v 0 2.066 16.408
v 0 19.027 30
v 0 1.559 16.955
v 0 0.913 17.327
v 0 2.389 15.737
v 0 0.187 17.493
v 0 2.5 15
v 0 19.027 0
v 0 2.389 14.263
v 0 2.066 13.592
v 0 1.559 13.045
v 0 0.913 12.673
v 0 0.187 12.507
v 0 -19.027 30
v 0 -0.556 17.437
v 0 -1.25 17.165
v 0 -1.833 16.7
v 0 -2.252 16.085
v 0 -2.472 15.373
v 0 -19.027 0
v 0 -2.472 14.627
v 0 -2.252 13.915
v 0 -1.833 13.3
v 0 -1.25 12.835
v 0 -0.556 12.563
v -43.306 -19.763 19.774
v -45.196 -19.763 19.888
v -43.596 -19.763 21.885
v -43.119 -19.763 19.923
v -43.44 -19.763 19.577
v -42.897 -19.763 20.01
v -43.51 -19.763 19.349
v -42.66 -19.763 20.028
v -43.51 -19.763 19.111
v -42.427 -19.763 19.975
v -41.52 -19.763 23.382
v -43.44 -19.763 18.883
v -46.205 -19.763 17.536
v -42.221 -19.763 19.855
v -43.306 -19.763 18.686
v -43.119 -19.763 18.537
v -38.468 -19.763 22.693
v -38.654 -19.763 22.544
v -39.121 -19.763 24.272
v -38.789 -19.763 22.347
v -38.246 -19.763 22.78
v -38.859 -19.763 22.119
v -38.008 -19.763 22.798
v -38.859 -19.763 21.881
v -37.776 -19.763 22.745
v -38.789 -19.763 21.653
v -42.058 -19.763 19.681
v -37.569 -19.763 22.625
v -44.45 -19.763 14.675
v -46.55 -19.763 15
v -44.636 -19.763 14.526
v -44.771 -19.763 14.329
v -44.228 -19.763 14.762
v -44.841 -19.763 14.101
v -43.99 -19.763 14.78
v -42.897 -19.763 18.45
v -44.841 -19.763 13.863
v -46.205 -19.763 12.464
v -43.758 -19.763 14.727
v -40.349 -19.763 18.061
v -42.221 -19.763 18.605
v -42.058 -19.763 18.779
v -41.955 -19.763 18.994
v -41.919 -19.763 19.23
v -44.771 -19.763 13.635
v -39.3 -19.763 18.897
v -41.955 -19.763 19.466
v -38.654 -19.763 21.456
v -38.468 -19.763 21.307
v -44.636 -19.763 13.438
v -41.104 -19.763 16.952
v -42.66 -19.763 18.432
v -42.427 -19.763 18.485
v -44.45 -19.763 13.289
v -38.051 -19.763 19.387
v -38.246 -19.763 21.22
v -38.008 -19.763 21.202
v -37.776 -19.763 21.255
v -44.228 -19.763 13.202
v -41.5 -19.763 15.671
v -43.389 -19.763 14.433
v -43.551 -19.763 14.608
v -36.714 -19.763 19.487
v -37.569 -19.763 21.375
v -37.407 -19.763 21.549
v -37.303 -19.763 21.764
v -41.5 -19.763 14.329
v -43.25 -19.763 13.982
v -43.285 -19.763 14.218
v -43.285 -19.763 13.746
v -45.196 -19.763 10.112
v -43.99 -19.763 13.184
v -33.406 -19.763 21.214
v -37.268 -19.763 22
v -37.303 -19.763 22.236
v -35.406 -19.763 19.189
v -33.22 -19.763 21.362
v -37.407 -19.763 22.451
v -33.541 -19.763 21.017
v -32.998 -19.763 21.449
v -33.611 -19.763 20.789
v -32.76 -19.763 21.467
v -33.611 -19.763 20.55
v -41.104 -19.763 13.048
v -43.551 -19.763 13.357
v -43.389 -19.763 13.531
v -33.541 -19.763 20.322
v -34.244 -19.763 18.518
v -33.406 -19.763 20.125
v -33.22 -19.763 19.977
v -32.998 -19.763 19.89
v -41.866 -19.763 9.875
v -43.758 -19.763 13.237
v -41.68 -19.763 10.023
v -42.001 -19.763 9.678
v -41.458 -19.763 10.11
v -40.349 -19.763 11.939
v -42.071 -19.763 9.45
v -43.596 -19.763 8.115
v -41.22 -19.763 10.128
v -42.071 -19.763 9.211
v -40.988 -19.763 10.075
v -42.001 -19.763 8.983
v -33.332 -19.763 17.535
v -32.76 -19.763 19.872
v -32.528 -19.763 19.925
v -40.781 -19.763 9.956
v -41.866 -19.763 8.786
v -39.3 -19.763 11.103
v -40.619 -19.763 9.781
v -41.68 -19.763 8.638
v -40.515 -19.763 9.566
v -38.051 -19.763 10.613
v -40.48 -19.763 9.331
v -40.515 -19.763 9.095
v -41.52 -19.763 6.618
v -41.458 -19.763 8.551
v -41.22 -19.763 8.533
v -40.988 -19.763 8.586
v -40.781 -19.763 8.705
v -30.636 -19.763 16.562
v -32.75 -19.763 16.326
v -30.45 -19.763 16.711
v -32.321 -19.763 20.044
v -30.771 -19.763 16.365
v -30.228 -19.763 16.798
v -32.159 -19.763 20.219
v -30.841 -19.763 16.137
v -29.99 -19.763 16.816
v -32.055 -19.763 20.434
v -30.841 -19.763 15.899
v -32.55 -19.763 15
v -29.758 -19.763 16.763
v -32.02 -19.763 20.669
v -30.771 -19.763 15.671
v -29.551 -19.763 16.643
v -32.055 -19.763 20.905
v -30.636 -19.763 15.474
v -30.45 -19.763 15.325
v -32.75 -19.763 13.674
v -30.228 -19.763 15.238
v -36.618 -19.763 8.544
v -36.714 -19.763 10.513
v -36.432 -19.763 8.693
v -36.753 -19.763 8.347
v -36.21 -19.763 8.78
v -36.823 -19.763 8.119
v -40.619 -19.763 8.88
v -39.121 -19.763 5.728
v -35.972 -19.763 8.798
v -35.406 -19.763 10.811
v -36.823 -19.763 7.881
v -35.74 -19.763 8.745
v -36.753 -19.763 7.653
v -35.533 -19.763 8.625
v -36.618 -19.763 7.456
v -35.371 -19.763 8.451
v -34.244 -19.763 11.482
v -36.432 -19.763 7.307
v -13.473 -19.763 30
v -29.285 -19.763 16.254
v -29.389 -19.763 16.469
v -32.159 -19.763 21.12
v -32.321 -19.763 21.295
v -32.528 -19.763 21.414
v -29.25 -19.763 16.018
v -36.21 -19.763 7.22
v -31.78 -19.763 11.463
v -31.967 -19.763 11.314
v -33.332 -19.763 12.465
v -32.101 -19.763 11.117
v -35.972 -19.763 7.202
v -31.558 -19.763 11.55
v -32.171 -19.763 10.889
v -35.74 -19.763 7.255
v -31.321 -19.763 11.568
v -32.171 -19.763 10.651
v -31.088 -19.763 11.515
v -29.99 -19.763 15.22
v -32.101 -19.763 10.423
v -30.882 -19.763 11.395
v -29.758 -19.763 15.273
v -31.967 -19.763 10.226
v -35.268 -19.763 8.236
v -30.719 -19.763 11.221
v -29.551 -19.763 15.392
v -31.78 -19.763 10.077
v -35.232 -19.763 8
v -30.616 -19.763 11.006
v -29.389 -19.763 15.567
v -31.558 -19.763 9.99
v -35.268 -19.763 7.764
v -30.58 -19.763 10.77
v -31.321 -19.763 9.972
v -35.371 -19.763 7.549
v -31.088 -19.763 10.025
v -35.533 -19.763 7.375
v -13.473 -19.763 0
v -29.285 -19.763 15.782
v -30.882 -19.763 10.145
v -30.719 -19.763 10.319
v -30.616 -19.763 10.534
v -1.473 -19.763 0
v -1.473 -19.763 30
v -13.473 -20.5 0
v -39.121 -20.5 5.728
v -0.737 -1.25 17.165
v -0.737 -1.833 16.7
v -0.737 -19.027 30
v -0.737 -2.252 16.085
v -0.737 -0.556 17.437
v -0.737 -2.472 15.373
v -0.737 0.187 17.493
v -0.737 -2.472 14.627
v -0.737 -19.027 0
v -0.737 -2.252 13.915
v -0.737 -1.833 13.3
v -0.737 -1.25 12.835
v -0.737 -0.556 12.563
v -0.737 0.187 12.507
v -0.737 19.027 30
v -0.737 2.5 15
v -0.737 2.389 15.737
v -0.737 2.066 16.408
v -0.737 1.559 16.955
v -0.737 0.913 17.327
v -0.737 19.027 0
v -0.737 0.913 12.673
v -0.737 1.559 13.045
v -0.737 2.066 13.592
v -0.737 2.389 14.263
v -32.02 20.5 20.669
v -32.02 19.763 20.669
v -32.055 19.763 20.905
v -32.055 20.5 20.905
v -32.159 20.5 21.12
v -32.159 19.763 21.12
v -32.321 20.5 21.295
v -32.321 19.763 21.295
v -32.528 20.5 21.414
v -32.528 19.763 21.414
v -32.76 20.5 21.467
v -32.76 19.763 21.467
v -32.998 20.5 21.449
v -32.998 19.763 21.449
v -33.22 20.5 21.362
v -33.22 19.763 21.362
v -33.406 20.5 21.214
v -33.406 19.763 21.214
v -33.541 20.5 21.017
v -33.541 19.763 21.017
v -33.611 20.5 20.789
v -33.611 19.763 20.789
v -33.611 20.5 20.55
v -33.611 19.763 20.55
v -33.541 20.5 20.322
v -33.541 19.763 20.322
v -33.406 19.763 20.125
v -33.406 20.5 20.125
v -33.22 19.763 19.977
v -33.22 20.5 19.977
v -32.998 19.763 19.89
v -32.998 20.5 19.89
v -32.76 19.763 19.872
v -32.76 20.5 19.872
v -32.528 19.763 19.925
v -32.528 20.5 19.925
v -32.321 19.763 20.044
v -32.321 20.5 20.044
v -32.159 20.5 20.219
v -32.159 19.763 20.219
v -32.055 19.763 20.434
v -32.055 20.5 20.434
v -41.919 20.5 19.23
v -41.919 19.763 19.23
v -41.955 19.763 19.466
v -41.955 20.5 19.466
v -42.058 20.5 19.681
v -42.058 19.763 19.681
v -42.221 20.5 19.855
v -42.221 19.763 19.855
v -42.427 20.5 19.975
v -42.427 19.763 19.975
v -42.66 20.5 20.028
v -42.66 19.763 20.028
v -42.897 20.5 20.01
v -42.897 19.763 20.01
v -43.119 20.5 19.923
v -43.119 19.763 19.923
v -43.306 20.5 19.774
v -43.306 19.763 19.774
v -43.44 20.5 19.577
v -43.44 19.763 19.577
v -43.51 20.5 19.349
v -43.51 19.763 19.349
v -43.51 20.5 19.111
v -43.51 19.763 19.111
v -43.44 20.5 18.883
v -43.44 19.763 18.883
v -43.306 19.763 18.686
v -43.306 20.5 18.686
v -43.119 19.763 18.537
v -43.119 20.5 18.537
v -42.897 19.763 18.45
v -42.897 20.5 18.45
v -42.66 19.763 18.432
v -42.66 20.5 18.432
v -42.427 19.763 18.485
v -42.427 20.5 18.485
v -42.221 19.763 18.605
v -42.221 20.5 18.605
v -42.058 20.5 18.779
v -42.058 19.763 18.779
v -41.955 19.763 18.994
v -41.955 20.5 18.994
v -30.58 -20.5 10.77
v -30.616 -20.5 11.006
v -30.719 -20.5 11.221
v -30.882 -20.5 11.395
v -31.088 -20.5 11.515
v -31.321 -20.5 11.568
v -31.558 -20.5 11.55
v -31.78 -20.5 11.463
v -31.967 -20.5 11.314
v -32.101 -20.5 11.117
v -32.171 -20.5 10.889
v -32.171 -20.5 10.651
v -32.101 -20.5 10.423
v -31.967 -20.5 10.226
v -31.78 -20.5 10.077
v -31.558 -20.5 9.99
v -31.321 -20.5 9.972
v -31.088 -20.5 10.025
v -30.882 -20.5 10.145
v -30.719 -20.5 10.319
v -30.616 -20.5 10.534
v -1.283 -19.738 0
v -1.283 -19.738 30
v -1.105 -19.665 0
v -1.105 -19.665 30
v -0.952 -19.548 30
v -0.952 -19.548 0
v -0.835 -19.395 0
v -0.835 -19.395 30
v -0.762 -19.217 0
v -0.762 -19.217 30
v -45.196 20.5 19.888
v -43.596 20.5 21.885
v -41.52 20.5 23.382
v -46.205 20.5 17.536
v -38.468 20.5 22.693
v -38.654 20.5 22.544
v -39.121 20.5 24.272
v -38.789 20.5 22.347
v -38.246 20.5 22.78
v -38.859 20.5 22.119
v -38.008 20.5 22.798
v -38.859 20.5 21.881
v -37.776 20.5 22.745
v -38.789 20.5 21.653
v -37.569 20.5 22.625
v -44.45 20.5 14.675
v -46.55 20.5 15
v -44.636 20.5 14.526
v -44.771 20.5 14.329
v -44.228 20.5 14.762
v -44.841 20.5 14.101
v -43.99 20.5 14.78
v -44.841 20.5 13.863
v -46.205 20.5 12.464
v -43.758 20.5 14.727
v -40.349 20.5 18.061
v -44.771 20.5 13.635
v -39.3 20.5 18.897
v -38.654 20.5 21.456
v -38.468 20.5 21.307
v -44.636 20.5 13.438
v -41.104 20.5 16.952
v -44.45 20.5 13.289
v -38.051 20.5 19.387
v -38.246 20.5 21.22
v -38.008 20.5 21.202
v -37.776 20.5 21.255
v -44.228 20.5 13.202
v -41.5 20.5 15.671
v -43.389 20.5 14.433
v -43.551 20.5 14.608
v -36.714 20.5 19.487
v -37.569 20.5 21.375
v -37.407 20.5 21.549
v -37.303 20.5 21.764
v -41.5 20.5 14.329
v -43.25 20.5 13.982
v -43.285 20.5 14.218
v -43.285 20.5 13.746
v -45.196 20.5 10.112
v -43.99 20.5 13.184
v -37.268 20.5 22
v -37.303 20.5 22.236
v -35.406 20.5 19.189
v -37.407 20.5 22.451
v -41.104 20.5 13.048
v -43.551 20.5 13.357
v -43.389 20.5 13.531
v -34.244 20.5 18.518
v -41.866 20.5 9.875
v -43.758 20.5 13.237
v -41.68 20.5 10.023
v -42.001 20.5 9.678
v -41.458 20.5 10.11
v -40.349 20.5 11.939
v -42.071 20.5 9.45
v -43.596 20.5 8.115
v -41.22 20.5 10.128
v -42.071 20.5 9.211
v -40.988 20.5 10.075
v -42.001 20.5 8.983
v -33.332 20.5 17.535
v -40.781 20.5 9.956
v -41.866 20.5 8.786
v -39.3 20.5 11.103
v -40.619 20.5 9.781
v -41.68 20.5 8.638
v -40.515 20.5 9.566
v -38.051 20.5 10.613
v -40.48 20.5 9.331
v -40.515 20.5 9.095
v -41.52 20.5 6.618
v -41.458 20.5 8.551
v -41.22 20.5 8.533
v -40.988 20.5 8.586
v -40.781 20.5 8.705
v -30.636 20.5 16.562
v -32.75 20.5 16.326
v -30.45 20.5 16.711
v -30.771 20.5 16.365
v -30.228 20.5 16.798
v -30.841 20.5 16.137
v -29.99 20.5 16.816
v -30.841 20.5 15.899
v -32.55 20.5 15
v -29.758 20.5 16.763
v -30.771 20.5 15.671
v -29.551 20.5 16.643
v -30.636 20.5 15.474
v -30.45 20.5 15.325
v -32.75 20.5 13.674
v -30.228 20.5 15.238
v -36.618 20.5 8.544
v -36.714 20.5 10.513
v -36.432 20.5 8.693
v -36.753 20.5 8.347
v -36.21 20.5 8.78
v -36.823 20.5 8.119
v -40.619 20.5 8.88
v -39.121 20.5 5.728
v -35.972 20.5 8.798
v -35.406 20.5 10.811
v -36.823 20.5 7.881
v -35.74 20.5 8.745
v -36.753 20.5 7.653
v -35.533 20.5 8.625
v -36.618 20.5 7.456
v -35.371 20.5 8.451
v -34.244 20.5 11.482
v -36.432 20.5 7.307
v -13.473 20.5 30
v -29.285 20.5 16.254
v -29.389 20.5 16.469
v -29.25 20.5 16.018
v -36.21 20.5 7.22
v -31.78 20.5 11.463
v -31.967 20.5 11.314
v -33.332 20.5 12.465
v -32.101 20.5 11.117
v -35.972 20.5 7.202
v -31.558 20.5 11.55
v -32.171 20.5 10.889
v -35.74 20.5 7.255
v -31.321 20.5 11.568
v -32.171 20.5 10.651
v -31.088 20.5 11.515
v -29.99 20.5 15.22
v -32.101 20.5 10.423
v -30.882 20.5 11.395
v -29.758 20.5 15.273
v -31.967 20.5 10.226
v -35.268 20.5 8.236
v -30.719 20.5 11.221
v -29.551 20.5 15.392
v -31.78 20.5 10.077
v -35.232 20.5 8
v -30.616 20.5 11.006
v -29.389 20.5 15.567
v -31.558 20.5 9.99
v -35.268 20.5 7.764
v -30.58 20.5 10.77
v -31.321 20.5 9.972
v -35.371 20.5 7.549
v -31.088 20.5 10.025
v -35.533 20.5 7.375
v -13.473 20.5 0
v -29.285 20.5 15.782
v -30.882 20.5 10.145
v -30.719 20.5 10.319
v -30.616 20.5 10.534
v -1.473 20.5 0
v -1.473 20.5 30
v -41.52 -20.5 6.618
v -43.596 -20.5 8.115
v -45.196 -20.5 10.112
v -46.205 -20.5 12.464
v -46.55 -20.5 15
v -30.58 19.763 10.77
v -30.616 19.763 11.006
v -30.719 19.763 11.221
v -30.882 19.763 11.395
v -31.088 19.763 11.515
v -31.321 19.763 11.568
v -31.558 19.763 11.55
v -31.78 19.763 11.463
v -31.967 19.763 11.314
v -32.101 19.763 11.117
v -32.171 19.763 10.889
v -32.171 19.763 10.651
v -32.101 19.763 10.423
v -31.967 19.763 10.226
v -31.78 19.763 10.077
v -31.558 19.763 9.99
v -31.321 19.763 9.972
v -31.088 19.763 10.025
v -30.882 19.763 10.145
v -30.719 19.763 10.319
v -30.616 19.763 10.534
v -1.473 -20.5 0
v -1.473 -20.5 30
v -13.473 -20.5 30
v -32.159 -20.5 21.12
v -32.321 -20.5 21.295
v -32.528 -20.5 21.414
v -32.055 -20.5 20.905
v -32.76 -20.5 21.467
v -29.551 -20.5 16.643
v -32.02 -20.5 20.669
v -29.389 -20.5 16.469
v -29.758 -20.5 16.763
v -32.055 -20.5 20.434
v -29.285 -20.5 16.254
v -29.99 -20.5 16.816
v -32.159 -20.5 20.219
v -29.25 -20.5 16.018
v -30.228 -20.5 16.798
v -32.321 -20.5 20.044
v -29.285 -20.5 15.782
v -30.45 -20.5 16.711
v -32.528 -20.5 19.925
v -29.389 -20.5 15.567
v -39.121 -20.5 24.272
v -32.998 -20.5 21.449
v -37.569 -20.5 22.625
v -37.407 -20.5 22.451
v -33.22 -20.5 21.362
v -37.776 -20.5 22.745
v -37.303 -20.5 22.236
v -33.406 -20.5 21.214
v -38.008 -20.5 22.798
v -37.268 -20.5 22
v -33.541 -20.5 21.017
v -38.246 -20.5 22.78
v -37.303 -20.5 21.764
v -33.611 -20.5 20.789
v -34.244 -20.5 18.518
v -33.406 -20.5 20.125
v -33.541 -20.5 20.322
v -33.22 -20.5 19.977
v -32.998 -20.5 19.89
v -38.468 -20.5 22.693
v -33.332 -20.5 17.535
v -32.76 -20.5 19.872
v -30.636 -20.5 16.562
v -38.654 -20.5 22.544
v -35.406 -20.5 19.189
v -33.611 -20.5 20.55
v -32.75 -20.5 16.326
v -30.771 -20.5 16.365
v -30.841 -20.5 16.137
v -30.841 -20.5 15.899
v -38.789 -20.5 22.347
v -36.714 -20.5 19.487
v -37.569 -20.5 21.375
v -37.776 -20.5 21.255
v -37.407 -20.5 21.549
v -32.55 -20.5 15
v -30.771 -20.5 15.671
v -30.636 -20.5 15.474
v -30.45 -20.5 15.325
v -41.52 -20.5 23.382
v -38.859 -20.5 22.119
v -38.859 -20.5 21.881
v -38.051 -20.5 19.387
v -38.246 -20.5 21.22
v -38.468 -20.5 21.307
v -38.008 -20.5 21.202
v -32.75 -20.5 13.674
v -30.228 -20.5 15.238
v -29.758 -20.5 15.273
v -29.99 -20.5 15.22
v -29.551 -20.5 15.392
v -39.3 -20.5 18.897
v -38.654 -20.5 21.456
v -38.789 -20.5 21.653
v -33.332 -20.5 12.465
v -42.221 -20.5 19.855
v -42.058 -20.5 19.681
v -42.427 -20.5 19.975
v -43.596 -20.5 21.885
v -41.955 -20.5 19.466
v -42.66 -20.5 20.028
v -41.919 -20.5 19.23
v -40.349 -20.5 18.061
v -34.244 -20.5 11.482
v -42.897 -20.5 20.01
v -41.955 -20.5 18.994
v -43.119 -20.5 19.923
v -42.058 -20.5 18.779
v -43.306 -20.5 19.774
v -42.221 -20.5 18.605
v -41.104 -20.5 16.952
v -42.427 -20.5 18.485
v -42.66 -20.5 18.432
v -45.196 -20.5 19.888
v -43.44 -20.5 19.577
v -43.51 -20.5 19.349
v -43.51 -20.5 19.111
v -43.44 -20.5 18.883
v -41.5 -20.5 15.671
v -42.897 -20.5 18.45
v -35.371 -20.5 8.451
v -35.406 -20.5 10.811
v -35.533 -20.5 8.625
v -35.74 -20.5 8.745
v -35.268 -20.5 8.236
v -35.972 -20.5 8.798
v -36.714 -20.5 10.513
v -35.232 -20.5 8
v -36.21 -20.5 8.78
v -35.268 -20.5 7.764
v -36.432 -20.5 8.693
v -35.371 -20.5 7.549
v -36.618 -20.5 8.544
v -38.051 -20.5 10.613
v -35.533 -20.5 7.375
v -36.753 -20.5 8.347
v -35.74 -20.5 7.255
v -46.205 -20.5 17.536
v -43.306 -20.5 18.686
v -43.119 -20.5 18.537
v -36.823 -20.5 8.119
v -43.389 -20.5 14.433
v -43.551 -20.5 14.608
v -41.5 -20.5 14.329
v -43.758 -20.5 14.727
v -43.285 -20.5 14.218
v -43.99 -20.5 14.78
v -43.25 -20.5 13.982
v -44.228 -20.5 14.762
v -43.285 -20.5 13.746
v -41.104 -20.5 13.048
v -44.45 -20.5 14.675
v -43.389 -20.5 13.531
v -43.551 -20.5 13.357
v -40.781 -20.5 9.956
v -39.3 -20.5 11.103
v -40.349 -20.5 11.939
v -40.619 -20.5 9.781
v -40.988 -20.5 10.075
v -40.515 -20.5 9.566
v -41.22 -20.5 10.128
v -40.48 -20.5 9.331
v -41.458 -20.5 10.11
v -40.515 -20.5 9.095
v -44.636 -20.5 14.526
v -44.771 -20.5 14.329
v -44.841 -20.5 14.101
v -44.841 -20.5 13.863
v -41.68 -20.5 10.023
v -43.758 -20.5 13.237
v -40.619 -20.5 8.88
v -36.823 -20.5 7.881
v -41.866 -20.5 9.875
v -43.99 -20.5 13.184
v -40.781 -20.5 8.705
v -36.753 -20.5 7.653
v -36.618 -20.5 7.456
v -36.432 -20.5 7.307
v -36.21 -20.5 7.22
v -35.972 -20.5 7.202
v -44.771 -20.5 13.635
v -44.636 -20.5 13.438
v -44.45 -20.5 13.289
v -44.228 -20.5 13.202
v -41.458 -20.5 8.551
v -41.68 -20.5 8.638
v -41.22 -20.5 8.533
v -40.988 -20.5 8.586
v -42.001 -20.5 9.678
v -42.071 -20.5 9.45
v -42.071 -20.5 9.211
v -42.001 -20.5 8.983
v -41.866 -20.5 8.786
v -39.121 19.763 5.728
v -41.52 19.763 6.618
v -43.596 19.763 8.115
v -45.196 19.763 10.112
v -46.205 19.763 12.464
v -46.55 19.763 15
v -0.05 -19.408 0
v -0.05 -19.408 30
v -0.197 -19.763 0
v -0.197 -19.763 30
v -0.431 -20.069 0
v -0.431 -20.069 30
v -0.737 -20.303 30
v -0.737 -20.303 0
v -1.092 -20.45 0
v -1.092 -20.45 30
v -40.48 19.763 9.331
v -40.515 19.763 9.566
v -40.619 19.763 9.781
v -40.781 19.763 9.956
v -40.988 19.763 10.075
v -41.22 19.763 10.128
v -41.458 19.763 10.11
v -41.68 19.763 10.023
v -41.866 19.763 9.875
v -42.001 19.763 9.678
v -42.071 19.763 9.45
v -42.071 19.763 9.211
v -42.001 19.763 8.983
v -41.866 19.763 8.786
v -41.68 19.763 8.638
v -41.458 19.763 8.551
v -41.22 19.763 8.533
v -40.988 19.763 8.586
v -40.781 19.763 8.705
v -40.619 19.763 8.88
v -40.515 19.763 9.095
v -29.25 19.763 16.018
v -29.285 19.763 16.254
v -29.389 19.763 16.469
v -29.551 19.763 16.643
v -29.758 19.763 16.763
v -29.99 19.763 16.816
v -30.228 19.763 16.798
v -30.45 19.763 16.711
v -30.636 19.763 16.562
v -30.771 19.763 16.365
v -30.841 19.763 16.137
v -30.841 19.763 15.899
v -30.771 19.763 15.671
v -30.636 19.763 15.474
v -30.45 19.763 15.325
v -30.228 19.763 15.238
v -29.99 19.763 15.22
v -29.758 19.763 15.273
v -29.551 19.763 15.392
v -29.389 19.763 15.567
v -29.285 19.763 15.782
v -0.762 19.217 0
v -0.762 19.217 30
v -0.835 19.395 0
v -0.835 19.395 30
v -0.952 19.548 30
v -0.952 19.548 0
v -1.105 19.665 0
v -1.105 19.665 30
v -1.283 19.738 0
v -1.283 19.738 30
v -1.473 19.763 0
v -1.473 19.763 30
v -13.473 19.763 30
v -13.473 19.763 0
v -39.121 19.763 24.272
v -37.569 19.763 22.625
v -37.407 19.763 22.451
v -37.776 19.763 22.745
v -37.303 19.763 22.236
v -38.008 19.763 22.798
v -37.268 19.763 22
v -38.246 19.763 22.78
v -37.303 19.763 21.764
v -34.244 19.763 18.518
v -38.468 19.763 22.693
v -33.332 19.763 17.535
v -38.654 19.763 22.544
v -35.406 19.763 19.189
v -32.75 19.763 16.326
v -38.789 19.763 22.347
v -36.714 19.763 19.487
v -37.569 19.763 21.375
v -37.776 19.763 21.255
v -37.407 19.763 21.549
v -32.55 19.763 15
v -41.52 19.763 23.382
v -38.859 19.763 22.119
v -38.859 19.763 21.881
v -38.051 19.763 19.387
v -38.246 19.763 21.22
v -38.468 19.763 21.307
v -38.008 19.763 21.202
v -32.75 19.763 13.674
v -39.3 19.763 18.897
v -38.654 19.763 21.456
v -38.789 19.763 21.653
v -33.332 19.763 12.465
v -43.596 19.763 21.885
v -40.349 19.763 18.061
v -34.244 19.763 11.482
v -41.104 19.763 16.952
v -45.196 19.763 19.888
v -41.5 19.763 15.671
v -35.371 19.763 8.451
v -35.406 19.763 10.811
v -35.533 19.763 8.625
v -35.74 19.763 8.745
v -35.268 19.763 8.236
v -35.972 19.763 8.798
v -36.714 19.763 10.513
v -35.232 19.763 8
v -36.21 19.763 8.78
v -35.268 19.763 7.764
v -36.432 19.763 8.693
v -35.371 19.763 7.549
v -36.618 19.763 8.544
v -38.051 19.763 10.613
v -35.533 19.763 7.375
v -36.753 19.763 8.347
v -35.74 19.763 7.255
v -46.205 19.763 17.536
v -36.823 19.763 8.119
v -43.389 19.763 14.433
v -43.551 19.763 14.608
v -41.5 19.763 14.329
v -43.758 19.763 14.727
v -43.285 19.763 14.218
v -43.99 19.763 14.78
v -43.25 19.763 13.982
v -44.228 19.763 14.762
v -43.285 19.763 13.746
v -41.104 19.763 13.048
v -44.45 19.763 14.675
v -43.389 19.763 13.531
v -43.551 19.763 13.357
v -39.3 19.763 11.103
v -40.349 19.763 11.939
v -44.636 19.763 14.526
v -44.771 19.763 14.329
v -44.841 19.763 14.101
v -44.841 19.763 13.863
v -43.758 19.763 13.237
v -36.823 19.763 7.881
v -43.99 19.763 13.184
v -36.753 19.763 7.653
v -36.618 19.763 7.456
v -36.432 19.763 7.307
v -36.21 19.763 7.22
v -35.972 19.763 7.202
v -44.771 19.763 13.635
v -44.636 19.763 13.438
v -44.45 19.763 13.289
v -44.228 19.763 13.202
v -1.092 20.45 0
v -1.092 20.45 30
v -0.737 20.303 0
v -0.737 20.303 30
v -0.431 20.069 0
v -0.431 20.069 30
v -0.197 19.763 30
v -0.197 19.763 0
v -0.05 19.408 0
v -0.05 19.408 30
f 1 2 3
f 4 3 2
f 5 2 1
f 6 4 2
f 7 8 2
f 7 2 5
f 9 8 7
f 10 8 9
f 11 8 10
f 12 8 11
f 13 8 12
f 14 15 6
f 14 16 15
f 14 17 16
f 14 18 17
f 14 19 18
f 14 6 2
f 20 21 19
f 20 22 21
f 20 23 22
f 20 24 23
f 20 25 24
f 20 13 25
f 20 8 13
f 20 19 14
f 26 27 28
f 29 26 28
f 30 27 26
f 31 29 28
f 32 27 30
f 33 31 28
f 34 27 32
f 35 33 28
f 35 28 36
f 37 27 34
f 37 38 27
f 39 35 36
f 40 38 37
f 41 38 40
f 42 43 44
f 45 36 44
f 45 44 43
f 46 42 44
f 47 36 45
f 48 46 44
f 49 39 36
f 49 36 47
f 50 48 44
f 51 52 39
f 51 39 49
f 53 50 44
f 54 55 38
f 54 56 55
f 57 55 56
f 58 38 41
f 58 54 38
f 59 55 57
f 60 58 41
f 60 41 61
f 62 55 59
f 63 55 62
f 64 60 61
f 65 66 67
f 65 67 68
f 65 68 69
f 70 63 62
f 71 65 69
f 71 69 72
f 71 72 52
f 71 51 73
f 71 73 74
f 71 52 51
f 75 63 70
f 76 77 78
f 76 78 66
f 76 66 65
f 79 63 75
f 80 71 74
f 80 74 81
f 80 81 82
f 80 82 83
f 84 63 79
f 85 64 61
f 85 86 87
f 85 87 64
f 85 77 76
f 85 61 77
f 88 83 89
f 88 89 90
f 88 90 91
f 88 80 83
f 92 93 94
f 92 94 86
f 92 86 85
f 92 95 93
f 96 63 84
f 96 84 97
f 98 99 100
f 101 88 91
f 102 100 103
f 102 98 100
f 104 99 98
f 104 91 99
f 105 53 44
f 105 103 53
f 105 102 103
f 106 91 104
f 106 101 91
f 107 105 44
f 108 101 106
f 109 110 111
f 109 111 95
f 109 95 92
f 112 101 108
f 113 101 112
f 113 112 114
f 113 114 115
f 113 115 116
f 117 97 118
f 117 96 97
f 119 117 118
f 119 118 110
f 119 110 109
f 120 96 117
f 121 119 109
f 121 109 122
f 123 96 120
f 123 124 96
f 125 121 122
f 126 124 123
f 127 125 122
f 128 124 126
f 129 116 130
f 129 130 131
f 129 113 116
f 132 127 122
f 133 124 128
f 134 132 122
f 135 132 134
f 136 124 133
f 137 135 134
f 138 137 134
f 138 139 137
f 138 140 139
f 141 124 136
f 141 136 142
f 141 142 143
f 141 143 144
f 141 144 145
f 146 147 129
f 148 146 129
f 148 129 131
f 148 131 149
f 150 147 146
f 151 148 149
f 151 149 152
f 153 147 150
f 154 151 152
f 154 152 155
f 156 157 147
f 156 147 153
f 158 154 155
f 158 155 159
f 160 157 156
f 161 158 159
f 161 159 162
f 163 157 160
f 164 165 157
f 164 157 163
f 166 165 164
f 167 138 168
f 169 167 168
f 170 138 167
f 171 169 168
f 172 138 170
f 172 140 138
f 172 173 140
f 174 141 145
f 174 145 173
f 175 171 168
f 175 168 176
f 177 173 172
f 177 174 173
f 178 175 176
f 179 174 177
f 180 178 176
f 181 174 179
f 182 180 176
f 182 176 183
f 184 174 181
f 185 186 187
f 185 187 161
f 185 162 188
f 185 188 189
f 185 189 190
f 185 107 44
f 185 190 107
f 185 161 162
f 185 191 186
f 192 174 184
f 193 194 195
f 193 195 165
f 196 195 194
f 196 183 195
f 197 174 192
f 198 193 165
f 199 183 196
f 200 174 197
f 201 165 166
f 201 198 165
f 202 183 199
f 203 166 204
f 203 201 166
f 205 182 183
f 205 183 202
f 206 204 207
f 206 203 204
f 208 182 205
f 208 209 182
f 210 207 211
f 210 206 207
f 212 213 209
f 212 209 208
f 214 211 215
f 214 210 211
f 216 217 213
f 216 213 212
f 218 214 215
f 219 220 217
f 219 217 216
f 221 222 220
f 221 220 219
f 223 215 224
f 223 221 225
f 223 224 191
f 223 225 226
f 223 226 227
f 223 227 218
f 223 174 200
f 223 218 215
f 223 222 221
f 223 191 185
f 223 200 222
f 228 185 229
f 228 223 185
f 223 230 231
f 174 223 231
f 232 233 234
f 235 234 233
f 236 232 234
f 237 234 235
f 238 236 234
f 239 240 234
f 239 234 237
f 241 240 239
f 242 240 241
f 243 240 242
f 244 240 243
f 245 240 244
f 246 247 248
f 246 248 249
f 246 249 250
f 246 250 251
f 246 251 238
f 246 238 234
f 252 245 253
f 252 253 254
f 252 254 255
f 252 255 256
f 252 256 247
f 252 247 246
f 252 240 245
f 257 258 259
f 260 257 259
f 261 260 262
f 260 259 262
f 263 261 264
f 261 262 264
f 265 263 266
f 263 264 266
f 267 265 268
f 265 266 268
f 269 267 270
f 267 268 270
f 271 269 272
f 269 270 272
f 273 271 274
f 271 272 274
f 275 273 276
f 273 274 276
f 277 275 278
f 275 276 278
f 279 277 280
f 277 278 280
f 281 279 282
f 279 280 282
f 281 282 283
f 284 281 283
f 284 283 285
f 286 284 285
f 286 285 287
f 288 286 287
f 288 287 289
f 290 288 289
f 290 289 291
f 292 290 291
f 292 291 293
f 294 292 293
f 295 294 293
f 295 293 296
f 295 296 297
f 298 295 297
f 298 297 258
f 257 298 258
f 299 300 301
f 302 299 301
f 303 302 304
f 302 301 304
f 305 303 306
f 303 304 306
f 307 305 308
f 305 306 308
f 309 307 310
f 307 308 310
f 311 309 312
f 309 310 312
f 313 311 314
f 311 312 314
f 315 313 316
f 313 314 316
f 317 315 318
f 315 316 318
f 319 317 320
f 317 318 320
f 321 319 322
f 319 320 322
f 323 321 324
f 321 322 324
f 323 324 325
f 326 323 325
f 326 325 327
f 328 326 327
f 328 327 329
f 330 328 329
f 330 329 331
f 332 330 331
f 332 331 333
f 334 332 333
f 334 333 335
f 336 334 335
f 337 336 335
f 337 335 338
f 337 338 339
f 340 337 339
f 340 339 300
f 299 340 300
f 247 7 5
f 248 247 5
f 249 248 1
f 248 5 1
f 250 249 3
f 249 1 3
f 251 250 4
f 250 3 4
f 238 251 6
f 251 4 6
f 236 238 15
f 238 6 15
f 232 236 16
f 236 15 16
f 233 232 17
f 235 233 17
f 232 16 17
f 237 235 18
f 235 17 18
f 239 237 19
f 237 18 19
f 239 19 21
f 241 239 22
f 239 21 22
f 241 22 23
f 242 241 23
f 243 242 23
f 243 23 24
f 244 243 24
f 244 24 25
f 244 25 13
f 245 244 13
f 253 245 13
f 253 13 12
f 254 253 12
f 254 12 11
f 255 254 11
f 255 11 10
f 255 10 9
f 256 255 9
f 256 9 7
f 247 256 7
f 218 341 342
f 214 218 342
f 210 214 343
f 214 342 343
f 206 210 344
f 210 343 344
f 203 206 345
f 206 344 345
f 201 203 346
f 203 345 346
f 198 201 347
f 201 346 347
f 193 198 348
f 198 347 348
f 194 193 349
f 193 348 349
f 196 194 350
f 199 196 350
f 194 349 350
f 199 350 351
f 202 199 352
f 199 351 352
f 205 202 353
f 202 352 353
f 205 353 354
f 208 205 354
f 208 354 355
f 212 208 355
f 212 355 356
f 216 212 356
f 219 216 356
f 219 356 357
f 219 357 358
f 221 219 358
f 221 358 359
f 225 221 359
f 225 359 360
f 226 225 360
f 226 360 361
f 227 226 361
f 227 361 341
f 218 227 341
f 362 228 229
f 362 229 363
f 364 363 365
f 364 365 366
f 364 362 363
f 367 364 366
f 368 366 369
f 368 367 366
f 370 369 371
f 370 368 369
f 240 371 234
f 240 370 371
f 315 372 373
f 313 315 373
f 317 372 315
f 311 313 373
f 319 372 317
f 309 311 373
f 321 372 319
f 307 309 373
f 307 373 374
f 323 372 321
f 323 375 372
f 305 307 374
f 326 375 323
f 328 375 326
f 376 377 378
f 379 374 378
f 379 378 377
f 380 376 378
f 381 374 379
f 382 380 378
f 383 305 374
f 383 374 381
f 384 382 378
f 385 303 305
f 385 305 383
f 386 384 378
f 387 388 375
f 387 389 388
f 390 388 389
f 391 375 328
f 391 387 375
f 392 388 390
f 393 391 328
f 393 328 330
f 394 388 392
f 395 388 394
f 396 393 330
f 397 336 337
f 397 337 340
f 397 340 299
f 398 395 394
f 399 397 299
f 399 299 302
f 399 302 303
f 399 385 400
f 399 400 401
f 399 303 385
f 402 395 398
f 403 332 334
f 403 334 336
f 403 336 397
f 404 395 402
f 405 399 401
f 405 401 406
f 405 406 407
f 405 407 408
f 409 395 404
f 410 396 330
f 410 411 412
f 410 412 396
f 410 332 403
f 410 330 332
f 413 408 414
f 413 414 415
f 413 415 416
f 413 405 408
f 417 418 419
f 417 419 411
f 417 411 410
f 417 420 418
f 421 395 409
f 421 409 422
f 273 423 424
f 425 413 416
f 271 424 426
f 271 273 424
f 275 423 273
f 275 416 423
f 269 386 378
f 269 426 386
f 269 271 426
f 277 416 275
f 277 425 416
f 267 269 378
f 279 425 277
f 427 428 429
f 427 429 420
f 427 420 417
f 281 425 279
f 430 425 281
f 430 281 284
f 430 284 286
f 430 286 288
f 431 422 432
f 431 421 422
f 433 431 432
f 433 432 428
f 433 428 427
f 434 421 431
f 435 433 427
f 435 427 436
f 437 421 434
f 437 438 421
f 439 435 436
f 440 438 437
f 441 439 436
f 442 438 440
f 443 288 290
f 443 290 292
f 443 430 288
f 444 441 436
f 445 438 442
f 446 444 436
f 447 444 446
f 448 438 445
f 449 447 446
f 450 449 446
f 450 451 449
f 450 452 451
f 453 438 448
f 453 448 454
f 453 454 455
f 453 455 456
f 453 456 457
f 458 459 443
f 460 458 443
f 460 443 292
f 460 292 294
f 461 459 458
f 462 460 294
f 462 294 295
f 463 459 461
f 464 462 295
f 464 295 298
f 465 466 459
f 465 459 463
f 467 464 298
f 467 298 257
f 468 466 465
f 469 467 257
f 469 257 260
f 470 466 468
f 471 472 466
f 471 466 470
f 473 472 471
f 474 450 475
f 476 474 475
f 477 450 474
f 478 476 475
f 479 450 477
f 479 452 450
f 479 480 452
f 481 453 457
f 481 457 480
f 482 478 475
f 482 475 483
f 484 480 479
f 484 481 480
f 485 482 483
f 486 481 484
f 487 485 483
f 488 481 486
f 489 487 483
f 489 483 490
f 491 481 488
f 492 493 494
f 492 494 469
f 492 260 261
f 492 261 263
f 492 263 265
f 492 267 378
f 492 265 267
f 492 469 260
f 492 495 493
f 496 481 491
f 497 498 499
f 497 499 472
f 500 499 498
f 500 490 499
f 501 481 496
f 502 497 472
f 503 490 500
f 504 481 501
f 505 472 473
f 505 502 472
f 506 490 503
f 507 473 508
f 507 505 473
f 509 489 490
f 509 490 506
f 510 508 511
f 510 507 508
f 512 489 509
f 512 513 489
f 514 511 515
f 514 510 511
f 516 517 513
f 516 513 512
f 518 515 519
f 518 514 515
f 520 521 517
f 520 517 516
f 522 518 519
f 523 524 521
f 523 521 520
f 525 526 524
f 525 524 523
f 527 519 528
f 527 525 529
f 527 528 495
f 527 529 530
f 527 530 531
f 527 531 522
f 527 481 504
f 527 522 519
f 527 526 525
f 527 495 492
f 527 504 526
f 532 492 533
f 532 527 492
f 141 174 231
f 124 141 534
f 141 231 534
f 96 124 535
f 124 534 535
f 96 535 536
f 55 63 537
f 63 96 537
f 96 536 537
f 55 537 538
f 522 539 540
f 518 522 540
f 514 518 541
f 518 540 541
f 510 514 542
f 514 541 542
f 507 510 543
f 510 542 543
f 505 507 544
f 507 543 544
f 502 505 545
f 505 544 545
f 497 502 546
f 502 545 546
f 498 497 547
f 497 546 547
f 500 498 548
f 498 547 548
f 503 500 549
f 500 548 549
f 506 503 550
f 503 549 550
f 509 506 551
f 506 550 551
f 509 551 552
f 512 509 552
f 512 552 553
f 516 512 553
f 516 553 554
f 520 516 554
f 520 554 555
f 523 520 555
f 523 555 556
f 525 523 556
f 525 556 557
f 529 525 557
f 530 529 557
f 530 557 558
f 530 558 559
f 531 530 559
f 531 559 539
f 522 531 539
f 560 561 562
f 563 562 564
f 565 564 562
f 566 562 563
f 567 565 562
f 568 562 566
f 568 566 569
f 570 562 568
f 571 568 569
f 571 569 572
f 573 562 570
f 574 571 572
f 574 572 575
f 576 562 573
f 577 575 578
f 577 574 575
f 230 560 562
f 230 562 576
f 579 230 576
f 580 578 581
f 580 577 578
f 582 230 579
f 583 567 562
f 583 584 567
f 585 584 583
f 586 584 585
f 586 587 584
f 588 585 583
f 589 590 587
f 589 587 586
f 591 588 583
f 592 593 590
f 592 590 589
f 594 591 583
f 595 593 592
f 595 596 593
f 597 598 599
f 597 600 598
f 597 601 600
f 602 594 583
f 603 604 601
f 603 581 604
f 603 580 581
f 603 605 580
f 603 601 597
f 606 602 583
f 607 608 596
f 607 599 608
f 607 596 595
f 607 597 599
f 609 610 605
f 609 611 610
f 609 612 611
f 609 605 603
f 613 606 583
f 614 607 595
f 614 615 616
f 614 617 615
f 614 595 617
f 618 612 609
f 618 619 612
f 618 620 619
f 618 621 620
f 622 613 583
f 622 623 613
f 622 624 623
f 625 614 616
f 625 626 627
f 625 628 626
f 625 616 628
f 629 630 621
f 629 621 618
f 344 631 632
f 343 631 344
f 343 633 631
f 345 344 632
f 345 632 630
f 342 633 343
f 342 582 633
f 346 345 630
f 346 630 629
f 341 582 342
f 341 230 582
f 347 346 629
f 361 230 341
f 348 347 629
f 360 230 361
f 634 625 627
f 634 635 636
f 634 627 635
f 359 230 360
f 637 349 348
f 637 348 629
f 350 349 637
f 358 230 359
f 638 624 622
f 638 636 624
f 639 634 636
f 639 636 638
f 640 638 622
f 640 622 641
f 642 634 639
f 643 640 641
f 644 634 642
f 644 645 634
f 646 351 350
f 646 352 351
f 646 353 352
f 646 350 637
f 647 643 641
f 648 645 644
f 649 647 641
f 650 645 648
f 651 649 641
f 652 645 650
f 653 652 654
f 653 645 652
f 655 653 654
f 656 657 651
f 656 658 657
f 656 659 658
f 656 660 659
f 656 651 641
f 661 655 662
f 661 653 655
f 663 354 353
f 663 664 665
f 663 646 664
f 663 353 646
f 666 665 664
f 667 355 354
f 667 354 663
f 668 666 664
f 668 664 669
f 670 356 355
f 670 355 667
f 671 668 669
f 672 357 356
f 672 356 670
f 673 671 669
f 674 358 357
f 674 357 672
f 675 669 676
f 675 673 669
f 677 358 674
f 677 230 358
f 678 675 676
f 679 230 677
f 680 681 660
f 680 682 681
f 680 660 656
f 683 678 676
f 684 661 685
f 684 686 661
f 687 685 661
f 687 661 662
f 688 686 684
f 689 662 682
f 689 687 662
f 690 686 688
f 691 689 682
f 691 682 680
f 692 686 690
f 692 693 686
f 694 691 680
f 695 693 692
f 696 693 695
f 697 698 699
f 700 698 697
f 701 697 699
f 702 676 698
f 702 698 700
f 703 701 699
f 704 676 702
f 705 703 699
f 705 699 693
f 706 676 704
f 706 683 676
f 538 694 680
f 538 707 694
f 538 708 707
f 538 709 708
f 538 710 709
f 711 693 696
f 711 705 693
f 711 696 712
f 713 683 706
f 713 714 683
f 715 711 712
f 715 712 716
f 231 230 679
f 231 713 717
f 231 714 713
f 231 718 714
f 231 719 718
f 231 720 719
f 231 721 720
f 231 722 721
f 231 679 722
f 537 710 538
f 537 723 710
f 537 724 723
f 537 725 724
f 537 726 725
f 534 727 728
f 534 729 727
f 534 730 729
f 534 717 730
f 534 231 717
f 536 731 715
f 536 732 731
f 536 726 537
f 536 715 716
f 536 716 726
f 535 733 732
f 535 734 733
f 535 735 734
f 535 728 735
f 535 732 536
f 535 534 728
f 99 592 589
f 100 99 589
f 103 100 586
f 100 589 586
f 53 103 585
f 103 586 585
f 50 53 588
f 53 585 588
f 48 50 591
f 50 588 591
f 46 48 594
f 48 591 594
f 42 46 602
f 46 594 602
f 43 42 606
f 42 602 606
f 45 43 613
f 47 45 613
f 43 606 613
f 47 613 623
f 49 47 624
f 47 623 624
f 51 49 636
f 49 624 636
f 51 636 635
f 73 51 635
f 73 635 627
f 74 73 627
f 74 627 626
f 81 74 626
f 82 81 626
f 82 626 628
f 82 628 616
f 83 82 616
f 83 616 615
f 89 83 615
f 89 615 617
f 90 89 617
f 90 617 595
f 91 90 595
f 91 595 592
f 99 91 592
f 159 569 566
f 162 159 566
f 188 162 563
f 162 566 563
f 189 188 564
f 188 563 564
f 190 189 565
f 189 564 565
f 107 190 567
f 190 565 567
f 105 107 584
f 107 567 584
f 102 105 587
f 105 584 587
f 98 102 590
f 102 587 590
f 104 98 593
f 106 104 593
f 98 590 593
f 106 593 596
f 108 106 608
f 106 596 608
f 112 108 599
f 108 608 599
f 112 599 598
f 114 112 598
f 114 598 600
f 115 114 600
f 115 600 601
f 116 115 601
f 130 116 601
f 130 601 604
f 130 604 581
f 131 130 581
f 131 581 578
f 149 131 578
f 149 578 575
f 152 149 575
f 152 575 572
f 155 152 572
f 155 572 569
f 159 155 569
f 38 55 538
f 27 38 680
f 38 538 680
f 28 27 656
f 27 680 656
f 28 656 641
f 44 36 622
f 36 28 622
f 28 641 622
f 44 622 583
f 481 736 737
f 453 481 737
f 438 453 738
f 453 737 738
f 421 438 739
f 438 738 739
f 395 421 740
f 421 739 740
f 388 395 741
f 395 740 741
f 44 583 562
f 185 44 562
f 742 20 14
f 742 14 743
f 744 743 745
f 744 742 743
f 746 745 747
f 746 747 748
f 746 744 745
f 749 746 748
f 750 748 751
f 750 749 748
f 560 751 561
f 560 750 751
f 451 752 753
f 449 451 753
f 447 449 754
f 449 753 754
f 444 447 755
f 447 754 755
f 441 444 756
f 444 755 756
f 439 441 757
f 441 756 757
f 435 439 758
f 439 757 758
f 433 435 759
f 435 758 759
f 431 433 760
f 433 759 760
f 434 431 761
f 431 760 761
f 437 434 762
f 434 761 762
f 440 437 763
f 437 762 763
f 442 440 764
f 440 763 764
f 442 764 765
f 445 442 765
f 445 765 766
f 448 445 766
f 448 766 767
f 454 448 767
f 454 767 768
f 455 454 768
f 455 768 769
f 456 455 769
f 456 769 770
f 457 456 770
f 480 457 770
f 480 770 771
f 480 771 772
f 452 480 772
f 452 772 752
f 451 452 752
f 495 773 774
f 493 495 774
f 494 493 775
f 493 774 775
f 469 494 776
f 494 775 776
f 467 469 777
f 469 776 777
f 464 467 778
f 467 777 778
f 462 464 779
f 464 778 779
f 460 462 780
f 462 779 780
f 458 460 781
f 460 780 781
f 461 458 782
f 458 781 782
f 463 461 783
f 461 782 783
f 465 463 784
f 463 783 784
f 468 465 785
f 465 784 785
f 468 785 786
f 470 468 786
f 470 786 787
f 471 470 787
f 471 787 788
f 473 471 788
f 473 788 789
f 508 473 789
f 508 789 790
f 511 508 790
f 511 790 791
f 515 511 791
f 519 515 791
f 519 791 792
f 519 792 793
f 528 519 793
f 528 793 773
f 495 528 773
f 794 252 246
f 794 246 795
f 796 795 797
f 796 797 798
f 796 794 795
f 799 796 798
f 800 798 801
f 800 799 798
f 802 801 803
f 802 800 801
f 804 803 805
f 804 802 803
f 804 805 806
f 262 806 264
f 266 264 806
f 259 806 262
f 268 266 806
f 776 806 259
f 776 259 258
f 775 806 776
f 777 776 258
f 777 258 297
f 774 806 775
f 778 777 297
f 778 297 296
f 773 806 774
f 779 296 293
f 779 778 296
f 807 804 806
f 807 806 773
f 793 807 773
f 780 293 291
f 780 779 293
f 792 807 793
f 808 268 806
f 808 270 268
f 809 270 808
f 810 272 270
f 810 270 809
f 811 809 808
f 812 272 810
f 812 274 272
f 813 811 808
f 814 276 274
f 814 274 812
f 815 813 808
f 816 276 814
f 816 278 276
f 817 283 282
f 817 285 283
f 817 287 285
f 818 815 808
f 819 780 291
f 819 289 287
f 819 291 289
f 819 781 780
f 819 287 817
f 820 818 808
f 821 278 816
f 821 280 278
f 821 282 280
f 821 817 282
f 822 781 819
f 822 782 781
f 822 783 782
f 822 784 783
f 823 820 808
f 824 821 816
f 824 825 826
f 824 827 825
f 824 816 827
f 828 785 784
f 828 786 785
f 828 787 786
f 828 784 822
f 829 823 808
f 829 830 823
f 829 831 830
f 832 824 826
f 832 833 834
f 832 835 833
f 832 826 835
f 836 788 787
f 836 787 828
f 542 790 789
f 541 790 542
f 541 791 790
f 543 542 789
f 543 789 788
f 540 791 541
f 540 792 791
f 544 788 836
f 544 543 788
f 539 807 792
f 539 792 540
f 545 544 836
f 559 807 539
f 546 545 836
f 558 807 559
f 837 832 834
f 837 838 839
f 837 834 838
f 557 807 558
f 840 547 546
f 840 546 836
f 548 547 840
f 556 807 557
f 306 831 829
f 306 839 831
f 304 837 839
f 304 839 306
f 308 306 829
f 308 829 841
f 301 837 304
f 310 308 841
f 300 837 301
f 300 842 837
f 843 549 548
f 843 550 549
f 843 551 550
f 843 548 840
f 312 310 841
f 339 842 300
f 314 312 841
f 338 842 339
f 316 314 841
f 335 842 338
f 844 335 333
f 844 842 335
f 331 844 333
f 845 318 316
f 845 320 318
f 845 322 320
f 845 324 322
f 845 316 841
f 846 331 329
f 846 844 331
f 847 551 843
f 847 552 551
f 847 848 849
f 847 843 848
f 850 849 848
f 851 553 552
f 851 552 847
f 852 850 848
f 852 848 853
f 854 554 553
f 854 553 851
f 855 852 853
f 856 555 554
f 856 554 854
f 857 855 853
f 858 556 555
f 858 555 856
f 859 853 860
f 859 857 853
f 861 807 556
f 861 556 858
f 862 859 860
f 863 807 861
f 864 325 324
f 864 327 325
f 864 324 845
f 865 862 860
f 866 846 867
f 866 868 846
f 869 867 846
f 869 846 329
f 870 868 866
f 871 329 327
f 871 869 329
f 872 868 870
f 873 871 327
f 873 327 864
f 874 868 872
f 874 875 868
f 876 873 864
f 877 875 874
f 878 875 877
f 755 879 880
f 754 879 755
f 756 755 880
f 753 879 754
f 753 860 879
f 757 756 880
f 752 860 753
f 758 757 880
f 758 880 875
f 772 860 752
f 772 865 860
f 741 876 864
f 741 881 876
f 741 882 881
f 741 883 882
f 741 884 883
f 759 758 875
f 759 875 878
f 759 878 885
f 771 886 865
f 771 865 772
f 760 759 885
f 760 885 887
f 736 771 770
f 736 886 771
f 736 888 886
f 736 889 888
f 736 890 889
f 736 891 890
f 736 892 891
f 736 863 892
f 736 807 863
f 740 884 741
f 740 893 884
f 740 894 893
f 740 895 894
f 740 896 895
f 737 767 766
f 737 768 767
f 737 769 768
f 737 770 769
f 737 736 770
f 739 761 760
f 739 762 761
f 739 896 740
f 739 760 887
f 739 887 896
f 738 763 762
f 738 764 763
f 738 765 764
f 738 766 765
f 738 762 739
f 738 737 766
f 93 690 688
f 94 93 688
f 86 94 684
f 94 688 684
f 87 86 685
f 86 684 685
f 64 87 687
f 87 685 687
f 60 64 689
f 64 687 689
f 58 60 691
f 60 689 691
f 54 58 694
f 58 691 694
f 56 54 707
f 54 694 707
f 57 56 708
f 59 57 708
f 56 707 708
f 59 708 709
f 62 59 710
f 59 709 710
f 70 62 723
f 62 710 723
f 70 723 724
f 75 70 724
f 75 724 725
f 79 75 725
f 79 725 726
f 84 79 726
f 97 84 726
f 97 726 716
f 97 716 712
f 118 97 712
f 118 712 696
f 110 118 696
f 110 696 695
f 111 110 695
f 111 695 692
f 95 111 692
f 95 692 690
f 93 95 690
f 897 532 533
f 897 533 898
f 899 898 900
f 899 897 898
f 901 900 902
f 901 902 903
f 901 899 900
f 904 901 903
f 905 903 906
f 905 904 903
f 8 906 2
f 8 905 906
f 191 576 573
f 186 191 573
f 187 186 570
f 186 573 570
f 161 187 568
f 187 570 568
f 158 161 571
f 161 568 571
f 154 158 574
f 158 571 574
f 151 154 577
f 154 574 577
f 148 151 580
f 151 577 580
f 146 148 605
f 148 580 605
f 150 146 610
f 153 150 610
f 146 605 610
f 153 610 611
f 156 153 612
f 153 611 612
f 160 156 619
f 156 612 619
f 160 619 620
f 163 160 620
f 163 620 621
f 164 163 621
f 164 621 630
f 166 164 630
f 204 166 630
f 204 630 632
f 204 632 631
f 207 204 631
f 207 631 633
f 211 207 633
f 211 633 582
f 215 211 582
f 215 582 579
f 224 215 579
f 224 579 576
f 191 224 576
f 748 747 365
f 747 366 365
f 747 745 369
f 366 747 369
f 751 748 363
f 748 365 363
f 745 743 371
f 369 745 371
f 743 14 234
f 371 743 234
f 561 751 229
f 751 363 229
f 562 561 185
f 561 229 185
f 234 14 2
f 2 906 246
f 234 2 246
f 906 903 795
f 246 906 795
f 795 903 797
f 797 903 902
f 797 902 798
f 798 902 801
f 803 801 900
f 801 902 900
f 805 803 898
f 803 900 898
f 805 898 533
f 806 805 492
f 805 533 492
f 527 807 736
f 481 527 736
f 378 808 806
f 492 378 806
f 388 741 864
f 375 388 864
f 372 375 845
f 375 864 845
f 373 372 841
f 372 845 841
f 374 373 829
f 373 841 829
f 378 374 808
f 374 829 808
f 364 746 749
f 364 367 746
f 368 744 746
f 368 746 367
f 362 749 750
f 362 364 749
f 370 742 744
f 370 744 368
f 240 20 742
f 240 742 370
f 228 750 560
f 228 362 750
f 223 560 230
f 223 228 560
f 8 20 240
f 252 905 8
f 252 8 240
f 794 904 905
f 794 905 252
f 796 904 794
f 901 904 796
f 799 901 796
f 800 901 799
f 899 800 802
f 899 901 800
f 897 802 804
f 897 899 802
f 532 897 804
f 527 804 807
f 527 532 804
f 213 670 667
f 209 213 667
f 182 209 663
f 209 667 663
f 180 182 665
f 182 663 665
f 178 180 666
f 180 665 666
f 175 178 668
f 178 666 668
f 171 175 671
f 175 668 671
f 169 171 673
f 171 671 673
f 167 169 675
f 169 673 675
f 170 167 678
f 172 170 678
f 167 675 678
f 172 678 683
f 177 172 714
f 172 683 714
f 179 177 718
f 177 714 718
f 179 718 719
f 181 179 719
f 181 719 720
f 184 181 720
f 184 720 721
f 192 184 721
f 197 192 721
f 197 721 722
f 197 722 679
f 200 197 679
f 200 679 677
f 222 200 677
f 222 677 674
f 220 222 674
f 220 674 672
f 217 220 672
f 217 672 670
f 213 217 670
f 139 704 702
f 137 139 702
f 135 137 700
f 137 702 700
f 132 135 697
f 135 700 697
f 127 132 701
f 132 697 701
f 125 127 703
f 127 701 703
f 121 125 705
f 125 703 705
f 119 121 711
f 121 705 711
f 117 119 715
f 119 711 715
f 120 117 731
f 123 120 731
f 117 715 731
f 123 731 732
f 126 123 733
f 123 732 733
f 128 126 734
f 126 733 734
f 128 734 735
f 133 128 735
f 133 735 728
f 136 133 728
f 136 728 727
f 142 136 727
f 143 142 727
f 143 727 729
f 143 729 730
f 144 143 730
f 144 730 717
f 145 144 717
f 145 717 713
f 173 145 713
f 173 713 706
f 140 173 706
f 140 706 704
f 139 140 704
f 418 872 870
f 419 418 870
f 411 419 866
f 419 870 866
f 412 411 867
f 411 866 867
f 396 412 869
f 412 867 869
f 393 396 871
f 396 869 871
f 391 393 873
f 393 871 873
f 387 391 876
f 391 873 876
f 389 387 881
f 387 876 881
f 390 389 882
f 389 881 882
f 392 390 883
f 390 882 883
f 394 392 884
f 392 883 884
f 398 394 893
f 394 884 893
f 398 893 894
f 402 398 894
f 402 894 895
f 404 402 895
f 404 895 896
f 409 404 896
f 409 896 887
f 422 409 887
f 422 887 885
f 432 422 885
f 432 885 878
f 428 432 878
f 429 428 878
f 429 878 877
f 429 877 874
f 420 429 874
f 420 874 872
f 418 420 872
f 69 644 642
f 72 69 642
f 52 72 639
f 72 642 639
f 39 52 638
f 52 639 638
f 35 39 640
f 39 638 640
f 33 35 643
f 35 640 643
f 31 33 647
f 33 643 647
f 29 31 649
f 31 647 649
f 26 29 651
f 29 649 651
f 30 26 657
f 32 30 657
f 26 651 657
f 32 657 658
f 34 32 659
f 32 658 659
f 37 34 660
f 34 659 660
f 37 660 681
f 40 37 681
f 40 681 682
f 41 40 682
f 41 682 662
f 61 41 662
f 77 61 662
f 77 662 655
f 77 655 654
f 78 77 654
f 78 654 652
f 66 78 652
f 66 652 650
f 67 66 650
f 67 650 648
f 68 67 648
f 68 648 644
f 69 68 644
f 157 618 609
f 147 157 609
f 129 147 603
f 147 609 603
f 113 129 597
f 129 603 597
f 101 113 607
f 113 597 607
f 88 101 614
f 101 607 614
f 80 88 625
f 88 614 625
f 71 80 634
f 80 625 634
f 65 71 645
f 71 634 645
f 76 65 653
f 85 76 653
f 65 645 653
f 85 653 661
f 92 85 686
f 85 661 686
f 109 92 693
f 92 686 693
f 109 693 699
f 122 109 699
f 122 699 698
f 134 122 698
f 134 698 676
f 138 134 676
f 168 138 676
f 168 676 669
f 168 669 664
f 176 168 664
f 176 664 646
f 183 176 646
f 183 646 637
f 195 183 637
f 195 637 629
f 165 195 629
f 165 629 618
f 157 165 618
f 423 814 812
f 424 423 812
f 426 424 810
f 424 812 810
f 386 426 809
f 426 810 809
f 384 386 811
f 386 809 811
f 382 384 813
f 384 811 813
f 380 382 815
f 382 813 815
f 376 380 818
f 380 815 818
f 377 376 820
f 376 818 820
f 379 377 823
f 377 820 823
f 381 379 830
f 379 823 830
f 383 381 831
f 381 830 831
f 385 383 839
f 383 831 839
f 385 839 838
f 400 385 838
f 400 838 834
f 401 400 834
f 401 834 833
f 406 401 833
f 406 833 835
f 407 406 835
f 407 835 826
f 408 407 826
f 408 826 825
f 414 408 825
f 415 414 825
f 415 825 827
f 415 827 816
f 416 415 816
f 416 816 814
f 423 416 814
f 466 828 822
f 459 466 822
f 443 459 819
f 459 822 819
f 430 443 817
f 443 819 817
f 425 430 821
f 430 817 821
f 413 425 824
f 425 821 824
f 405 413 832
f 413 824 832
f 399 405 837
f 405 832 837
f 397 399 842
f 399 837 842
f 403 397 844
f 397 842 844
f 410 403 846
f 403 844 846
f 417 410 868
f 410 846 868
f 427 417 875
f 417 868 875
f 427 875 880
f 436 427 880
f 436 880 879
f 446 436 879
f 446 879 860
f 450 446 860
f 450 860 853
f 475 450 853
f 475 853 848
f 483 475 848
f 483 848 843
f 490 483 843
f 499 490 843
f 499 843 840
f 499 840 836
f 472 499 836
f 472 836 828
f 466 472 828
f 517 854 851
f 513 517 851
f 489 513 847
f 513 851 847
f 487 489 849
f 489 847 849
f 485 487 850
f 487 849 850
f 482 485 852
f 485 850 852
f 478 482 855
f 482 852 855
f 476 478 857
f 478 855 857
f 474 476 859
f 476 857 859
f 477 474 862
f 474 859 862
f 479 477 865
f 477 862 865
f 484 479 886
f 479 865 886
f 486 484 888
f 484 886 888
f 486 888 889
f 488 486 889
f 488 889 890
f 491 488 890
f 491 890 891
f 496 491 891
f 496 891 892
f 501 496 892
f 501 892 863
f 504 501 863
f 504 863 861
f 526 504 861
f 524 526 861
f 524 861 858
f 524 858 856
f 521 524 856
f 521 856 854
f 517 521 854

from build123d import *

# Parameters (mm, degrees)
T_LE_DE_BASE_PLI_E1_DEPTH = 30
ESQUISSE13_R              = 4.5
ESQUISSE13_R_2            = 0.8
ENL_V_MAT_EXTRU_2_DEPTH   = 72.281133549
SKETCH1_R                 = 2.5
CUT_EXTRUDE1_DEPTH        = 60.052053397


# Sheet-metal steps are written as plain solids
with BuildPart() as part:
    # Esquisse1 → Tôle de base pliée1 (new body)
    with BuildSketch(Plane.XY):
        with BuildLine():
            Line((-50, 20.5), (-1.4732, 20.5))
            ThreePointArc((-1.4732, 20.5), (-0.43149029, 20.06850971), (0, 19.0268))
            Line((0, 19.0268), (0, -19.0268))
            ThreePointArc((0, -19.0268), (-0.43149029, -20.06850971), (-1.4732, -20.5))
            Line((-1.4732, -20.5), (-50, -20.5))
            Line((-50, -20.5), (-50, -19.7634))
            Line((-50, -19.7634), (-1.4732, -19.7634))
            ThreePointArc((-1.4732, -19.7634), (-0.952345145, -19.547654855), (-0.7366, -19.0268))
            Line((-0.7366, -19.0268), (-0.7366, 19.0268))
            ThreePointArc((-0.7366, 19.0268), (-0.952345145, 19.547654855), (-1.4732, 19.7634))
            Line((-1.4732, 19.7634), (-50, 19.7634))
            Line((-50, 19.7634), (-50, 20.5))
        make_face()
    extrude(amount=T_LE_DE_BASE_PLI_E1_DEPTH)

    # Esquisse13 → Enlèv. mat.-Extru.2 (cut, through all)
    with BuildSketch(Plane.XZ.offset(20.5)):
        with BuildLine():
            ThreePointArc((-46.549919552, 15), (-44.463516741, 20.940418901), (-39.120745506, 24.271552182))
            Line((-39.120745506, 24.271552182), (-13.4732, 30))
            Line((-13.4732, 30), (-50, 30))
            Line((-50, 30), (-50, 15))
            Line((-50, 15), (-46.549919552, 15))
        make_face()
        with BuildLine():
            Line((-13.4732, 0), (-39.120745506, 5.728447818))
            ThreePointArc((-39.120745506, 5.728447818), (-44.463516741, 9.059581099), (-46.549919552, 15))
            Line((-46.549919552, 15), (-50, 15))
            Line((-50, 15), (-50, 0))
            Line((-50, 0), (-13.4732, 0))
        make_face()
        with Locations((-37.049919552, 15)):
            Circle(ESQUISSE13_R)
        with Locations((-30.049919552, 16.017866465)):
            Circle(ESQUISSE13_R_2)
        with Locations((-32.819912364, 20.669487748)):
            Circle(ESQUISSE13_R_2)
        with Locations((-38.067786017, 22)):
            Circle(ESQUISSE13_R_2)
        with Locations((-42.7194073, 19.230007189)):
            Circle(ESQUISSE13_R_2)
        with Locations((-44.049919552, 13.982133535)):
            Circle(ESQUISSE13_R_2)
        with Locations((-41.279926741, 9.330512252)):
            Circle(ESQUISSE13_R_2)
        with Locations((-36.032053088, 8)):
            Circle(ESQUISSE13_R_2)
        with Locations((-31.380431805, 10.769992811)):
            Circle(ESQUISSE13_R_2)
    extrude(amount=-ENL_V_MAT_EXTRU_2_DEPTH, mode=Mode.SUBTRACT)

    # Sketch1 → Cut-Extrude1 (cut, through all)
    with BuildSketch(Plane(origin=(0, 0, 0), x_dir=(0, 0, -1), z_dir=(1, 0, 0))):
        with Locations(Location((-15, 0, 0), (0, 0, 90))):
            Circle(SKETCH1_R)
    extrude(amount=-CUT_EXTRUDE1_DEPTH, mode=Mode.SUBTRACT)


solid = part.part
